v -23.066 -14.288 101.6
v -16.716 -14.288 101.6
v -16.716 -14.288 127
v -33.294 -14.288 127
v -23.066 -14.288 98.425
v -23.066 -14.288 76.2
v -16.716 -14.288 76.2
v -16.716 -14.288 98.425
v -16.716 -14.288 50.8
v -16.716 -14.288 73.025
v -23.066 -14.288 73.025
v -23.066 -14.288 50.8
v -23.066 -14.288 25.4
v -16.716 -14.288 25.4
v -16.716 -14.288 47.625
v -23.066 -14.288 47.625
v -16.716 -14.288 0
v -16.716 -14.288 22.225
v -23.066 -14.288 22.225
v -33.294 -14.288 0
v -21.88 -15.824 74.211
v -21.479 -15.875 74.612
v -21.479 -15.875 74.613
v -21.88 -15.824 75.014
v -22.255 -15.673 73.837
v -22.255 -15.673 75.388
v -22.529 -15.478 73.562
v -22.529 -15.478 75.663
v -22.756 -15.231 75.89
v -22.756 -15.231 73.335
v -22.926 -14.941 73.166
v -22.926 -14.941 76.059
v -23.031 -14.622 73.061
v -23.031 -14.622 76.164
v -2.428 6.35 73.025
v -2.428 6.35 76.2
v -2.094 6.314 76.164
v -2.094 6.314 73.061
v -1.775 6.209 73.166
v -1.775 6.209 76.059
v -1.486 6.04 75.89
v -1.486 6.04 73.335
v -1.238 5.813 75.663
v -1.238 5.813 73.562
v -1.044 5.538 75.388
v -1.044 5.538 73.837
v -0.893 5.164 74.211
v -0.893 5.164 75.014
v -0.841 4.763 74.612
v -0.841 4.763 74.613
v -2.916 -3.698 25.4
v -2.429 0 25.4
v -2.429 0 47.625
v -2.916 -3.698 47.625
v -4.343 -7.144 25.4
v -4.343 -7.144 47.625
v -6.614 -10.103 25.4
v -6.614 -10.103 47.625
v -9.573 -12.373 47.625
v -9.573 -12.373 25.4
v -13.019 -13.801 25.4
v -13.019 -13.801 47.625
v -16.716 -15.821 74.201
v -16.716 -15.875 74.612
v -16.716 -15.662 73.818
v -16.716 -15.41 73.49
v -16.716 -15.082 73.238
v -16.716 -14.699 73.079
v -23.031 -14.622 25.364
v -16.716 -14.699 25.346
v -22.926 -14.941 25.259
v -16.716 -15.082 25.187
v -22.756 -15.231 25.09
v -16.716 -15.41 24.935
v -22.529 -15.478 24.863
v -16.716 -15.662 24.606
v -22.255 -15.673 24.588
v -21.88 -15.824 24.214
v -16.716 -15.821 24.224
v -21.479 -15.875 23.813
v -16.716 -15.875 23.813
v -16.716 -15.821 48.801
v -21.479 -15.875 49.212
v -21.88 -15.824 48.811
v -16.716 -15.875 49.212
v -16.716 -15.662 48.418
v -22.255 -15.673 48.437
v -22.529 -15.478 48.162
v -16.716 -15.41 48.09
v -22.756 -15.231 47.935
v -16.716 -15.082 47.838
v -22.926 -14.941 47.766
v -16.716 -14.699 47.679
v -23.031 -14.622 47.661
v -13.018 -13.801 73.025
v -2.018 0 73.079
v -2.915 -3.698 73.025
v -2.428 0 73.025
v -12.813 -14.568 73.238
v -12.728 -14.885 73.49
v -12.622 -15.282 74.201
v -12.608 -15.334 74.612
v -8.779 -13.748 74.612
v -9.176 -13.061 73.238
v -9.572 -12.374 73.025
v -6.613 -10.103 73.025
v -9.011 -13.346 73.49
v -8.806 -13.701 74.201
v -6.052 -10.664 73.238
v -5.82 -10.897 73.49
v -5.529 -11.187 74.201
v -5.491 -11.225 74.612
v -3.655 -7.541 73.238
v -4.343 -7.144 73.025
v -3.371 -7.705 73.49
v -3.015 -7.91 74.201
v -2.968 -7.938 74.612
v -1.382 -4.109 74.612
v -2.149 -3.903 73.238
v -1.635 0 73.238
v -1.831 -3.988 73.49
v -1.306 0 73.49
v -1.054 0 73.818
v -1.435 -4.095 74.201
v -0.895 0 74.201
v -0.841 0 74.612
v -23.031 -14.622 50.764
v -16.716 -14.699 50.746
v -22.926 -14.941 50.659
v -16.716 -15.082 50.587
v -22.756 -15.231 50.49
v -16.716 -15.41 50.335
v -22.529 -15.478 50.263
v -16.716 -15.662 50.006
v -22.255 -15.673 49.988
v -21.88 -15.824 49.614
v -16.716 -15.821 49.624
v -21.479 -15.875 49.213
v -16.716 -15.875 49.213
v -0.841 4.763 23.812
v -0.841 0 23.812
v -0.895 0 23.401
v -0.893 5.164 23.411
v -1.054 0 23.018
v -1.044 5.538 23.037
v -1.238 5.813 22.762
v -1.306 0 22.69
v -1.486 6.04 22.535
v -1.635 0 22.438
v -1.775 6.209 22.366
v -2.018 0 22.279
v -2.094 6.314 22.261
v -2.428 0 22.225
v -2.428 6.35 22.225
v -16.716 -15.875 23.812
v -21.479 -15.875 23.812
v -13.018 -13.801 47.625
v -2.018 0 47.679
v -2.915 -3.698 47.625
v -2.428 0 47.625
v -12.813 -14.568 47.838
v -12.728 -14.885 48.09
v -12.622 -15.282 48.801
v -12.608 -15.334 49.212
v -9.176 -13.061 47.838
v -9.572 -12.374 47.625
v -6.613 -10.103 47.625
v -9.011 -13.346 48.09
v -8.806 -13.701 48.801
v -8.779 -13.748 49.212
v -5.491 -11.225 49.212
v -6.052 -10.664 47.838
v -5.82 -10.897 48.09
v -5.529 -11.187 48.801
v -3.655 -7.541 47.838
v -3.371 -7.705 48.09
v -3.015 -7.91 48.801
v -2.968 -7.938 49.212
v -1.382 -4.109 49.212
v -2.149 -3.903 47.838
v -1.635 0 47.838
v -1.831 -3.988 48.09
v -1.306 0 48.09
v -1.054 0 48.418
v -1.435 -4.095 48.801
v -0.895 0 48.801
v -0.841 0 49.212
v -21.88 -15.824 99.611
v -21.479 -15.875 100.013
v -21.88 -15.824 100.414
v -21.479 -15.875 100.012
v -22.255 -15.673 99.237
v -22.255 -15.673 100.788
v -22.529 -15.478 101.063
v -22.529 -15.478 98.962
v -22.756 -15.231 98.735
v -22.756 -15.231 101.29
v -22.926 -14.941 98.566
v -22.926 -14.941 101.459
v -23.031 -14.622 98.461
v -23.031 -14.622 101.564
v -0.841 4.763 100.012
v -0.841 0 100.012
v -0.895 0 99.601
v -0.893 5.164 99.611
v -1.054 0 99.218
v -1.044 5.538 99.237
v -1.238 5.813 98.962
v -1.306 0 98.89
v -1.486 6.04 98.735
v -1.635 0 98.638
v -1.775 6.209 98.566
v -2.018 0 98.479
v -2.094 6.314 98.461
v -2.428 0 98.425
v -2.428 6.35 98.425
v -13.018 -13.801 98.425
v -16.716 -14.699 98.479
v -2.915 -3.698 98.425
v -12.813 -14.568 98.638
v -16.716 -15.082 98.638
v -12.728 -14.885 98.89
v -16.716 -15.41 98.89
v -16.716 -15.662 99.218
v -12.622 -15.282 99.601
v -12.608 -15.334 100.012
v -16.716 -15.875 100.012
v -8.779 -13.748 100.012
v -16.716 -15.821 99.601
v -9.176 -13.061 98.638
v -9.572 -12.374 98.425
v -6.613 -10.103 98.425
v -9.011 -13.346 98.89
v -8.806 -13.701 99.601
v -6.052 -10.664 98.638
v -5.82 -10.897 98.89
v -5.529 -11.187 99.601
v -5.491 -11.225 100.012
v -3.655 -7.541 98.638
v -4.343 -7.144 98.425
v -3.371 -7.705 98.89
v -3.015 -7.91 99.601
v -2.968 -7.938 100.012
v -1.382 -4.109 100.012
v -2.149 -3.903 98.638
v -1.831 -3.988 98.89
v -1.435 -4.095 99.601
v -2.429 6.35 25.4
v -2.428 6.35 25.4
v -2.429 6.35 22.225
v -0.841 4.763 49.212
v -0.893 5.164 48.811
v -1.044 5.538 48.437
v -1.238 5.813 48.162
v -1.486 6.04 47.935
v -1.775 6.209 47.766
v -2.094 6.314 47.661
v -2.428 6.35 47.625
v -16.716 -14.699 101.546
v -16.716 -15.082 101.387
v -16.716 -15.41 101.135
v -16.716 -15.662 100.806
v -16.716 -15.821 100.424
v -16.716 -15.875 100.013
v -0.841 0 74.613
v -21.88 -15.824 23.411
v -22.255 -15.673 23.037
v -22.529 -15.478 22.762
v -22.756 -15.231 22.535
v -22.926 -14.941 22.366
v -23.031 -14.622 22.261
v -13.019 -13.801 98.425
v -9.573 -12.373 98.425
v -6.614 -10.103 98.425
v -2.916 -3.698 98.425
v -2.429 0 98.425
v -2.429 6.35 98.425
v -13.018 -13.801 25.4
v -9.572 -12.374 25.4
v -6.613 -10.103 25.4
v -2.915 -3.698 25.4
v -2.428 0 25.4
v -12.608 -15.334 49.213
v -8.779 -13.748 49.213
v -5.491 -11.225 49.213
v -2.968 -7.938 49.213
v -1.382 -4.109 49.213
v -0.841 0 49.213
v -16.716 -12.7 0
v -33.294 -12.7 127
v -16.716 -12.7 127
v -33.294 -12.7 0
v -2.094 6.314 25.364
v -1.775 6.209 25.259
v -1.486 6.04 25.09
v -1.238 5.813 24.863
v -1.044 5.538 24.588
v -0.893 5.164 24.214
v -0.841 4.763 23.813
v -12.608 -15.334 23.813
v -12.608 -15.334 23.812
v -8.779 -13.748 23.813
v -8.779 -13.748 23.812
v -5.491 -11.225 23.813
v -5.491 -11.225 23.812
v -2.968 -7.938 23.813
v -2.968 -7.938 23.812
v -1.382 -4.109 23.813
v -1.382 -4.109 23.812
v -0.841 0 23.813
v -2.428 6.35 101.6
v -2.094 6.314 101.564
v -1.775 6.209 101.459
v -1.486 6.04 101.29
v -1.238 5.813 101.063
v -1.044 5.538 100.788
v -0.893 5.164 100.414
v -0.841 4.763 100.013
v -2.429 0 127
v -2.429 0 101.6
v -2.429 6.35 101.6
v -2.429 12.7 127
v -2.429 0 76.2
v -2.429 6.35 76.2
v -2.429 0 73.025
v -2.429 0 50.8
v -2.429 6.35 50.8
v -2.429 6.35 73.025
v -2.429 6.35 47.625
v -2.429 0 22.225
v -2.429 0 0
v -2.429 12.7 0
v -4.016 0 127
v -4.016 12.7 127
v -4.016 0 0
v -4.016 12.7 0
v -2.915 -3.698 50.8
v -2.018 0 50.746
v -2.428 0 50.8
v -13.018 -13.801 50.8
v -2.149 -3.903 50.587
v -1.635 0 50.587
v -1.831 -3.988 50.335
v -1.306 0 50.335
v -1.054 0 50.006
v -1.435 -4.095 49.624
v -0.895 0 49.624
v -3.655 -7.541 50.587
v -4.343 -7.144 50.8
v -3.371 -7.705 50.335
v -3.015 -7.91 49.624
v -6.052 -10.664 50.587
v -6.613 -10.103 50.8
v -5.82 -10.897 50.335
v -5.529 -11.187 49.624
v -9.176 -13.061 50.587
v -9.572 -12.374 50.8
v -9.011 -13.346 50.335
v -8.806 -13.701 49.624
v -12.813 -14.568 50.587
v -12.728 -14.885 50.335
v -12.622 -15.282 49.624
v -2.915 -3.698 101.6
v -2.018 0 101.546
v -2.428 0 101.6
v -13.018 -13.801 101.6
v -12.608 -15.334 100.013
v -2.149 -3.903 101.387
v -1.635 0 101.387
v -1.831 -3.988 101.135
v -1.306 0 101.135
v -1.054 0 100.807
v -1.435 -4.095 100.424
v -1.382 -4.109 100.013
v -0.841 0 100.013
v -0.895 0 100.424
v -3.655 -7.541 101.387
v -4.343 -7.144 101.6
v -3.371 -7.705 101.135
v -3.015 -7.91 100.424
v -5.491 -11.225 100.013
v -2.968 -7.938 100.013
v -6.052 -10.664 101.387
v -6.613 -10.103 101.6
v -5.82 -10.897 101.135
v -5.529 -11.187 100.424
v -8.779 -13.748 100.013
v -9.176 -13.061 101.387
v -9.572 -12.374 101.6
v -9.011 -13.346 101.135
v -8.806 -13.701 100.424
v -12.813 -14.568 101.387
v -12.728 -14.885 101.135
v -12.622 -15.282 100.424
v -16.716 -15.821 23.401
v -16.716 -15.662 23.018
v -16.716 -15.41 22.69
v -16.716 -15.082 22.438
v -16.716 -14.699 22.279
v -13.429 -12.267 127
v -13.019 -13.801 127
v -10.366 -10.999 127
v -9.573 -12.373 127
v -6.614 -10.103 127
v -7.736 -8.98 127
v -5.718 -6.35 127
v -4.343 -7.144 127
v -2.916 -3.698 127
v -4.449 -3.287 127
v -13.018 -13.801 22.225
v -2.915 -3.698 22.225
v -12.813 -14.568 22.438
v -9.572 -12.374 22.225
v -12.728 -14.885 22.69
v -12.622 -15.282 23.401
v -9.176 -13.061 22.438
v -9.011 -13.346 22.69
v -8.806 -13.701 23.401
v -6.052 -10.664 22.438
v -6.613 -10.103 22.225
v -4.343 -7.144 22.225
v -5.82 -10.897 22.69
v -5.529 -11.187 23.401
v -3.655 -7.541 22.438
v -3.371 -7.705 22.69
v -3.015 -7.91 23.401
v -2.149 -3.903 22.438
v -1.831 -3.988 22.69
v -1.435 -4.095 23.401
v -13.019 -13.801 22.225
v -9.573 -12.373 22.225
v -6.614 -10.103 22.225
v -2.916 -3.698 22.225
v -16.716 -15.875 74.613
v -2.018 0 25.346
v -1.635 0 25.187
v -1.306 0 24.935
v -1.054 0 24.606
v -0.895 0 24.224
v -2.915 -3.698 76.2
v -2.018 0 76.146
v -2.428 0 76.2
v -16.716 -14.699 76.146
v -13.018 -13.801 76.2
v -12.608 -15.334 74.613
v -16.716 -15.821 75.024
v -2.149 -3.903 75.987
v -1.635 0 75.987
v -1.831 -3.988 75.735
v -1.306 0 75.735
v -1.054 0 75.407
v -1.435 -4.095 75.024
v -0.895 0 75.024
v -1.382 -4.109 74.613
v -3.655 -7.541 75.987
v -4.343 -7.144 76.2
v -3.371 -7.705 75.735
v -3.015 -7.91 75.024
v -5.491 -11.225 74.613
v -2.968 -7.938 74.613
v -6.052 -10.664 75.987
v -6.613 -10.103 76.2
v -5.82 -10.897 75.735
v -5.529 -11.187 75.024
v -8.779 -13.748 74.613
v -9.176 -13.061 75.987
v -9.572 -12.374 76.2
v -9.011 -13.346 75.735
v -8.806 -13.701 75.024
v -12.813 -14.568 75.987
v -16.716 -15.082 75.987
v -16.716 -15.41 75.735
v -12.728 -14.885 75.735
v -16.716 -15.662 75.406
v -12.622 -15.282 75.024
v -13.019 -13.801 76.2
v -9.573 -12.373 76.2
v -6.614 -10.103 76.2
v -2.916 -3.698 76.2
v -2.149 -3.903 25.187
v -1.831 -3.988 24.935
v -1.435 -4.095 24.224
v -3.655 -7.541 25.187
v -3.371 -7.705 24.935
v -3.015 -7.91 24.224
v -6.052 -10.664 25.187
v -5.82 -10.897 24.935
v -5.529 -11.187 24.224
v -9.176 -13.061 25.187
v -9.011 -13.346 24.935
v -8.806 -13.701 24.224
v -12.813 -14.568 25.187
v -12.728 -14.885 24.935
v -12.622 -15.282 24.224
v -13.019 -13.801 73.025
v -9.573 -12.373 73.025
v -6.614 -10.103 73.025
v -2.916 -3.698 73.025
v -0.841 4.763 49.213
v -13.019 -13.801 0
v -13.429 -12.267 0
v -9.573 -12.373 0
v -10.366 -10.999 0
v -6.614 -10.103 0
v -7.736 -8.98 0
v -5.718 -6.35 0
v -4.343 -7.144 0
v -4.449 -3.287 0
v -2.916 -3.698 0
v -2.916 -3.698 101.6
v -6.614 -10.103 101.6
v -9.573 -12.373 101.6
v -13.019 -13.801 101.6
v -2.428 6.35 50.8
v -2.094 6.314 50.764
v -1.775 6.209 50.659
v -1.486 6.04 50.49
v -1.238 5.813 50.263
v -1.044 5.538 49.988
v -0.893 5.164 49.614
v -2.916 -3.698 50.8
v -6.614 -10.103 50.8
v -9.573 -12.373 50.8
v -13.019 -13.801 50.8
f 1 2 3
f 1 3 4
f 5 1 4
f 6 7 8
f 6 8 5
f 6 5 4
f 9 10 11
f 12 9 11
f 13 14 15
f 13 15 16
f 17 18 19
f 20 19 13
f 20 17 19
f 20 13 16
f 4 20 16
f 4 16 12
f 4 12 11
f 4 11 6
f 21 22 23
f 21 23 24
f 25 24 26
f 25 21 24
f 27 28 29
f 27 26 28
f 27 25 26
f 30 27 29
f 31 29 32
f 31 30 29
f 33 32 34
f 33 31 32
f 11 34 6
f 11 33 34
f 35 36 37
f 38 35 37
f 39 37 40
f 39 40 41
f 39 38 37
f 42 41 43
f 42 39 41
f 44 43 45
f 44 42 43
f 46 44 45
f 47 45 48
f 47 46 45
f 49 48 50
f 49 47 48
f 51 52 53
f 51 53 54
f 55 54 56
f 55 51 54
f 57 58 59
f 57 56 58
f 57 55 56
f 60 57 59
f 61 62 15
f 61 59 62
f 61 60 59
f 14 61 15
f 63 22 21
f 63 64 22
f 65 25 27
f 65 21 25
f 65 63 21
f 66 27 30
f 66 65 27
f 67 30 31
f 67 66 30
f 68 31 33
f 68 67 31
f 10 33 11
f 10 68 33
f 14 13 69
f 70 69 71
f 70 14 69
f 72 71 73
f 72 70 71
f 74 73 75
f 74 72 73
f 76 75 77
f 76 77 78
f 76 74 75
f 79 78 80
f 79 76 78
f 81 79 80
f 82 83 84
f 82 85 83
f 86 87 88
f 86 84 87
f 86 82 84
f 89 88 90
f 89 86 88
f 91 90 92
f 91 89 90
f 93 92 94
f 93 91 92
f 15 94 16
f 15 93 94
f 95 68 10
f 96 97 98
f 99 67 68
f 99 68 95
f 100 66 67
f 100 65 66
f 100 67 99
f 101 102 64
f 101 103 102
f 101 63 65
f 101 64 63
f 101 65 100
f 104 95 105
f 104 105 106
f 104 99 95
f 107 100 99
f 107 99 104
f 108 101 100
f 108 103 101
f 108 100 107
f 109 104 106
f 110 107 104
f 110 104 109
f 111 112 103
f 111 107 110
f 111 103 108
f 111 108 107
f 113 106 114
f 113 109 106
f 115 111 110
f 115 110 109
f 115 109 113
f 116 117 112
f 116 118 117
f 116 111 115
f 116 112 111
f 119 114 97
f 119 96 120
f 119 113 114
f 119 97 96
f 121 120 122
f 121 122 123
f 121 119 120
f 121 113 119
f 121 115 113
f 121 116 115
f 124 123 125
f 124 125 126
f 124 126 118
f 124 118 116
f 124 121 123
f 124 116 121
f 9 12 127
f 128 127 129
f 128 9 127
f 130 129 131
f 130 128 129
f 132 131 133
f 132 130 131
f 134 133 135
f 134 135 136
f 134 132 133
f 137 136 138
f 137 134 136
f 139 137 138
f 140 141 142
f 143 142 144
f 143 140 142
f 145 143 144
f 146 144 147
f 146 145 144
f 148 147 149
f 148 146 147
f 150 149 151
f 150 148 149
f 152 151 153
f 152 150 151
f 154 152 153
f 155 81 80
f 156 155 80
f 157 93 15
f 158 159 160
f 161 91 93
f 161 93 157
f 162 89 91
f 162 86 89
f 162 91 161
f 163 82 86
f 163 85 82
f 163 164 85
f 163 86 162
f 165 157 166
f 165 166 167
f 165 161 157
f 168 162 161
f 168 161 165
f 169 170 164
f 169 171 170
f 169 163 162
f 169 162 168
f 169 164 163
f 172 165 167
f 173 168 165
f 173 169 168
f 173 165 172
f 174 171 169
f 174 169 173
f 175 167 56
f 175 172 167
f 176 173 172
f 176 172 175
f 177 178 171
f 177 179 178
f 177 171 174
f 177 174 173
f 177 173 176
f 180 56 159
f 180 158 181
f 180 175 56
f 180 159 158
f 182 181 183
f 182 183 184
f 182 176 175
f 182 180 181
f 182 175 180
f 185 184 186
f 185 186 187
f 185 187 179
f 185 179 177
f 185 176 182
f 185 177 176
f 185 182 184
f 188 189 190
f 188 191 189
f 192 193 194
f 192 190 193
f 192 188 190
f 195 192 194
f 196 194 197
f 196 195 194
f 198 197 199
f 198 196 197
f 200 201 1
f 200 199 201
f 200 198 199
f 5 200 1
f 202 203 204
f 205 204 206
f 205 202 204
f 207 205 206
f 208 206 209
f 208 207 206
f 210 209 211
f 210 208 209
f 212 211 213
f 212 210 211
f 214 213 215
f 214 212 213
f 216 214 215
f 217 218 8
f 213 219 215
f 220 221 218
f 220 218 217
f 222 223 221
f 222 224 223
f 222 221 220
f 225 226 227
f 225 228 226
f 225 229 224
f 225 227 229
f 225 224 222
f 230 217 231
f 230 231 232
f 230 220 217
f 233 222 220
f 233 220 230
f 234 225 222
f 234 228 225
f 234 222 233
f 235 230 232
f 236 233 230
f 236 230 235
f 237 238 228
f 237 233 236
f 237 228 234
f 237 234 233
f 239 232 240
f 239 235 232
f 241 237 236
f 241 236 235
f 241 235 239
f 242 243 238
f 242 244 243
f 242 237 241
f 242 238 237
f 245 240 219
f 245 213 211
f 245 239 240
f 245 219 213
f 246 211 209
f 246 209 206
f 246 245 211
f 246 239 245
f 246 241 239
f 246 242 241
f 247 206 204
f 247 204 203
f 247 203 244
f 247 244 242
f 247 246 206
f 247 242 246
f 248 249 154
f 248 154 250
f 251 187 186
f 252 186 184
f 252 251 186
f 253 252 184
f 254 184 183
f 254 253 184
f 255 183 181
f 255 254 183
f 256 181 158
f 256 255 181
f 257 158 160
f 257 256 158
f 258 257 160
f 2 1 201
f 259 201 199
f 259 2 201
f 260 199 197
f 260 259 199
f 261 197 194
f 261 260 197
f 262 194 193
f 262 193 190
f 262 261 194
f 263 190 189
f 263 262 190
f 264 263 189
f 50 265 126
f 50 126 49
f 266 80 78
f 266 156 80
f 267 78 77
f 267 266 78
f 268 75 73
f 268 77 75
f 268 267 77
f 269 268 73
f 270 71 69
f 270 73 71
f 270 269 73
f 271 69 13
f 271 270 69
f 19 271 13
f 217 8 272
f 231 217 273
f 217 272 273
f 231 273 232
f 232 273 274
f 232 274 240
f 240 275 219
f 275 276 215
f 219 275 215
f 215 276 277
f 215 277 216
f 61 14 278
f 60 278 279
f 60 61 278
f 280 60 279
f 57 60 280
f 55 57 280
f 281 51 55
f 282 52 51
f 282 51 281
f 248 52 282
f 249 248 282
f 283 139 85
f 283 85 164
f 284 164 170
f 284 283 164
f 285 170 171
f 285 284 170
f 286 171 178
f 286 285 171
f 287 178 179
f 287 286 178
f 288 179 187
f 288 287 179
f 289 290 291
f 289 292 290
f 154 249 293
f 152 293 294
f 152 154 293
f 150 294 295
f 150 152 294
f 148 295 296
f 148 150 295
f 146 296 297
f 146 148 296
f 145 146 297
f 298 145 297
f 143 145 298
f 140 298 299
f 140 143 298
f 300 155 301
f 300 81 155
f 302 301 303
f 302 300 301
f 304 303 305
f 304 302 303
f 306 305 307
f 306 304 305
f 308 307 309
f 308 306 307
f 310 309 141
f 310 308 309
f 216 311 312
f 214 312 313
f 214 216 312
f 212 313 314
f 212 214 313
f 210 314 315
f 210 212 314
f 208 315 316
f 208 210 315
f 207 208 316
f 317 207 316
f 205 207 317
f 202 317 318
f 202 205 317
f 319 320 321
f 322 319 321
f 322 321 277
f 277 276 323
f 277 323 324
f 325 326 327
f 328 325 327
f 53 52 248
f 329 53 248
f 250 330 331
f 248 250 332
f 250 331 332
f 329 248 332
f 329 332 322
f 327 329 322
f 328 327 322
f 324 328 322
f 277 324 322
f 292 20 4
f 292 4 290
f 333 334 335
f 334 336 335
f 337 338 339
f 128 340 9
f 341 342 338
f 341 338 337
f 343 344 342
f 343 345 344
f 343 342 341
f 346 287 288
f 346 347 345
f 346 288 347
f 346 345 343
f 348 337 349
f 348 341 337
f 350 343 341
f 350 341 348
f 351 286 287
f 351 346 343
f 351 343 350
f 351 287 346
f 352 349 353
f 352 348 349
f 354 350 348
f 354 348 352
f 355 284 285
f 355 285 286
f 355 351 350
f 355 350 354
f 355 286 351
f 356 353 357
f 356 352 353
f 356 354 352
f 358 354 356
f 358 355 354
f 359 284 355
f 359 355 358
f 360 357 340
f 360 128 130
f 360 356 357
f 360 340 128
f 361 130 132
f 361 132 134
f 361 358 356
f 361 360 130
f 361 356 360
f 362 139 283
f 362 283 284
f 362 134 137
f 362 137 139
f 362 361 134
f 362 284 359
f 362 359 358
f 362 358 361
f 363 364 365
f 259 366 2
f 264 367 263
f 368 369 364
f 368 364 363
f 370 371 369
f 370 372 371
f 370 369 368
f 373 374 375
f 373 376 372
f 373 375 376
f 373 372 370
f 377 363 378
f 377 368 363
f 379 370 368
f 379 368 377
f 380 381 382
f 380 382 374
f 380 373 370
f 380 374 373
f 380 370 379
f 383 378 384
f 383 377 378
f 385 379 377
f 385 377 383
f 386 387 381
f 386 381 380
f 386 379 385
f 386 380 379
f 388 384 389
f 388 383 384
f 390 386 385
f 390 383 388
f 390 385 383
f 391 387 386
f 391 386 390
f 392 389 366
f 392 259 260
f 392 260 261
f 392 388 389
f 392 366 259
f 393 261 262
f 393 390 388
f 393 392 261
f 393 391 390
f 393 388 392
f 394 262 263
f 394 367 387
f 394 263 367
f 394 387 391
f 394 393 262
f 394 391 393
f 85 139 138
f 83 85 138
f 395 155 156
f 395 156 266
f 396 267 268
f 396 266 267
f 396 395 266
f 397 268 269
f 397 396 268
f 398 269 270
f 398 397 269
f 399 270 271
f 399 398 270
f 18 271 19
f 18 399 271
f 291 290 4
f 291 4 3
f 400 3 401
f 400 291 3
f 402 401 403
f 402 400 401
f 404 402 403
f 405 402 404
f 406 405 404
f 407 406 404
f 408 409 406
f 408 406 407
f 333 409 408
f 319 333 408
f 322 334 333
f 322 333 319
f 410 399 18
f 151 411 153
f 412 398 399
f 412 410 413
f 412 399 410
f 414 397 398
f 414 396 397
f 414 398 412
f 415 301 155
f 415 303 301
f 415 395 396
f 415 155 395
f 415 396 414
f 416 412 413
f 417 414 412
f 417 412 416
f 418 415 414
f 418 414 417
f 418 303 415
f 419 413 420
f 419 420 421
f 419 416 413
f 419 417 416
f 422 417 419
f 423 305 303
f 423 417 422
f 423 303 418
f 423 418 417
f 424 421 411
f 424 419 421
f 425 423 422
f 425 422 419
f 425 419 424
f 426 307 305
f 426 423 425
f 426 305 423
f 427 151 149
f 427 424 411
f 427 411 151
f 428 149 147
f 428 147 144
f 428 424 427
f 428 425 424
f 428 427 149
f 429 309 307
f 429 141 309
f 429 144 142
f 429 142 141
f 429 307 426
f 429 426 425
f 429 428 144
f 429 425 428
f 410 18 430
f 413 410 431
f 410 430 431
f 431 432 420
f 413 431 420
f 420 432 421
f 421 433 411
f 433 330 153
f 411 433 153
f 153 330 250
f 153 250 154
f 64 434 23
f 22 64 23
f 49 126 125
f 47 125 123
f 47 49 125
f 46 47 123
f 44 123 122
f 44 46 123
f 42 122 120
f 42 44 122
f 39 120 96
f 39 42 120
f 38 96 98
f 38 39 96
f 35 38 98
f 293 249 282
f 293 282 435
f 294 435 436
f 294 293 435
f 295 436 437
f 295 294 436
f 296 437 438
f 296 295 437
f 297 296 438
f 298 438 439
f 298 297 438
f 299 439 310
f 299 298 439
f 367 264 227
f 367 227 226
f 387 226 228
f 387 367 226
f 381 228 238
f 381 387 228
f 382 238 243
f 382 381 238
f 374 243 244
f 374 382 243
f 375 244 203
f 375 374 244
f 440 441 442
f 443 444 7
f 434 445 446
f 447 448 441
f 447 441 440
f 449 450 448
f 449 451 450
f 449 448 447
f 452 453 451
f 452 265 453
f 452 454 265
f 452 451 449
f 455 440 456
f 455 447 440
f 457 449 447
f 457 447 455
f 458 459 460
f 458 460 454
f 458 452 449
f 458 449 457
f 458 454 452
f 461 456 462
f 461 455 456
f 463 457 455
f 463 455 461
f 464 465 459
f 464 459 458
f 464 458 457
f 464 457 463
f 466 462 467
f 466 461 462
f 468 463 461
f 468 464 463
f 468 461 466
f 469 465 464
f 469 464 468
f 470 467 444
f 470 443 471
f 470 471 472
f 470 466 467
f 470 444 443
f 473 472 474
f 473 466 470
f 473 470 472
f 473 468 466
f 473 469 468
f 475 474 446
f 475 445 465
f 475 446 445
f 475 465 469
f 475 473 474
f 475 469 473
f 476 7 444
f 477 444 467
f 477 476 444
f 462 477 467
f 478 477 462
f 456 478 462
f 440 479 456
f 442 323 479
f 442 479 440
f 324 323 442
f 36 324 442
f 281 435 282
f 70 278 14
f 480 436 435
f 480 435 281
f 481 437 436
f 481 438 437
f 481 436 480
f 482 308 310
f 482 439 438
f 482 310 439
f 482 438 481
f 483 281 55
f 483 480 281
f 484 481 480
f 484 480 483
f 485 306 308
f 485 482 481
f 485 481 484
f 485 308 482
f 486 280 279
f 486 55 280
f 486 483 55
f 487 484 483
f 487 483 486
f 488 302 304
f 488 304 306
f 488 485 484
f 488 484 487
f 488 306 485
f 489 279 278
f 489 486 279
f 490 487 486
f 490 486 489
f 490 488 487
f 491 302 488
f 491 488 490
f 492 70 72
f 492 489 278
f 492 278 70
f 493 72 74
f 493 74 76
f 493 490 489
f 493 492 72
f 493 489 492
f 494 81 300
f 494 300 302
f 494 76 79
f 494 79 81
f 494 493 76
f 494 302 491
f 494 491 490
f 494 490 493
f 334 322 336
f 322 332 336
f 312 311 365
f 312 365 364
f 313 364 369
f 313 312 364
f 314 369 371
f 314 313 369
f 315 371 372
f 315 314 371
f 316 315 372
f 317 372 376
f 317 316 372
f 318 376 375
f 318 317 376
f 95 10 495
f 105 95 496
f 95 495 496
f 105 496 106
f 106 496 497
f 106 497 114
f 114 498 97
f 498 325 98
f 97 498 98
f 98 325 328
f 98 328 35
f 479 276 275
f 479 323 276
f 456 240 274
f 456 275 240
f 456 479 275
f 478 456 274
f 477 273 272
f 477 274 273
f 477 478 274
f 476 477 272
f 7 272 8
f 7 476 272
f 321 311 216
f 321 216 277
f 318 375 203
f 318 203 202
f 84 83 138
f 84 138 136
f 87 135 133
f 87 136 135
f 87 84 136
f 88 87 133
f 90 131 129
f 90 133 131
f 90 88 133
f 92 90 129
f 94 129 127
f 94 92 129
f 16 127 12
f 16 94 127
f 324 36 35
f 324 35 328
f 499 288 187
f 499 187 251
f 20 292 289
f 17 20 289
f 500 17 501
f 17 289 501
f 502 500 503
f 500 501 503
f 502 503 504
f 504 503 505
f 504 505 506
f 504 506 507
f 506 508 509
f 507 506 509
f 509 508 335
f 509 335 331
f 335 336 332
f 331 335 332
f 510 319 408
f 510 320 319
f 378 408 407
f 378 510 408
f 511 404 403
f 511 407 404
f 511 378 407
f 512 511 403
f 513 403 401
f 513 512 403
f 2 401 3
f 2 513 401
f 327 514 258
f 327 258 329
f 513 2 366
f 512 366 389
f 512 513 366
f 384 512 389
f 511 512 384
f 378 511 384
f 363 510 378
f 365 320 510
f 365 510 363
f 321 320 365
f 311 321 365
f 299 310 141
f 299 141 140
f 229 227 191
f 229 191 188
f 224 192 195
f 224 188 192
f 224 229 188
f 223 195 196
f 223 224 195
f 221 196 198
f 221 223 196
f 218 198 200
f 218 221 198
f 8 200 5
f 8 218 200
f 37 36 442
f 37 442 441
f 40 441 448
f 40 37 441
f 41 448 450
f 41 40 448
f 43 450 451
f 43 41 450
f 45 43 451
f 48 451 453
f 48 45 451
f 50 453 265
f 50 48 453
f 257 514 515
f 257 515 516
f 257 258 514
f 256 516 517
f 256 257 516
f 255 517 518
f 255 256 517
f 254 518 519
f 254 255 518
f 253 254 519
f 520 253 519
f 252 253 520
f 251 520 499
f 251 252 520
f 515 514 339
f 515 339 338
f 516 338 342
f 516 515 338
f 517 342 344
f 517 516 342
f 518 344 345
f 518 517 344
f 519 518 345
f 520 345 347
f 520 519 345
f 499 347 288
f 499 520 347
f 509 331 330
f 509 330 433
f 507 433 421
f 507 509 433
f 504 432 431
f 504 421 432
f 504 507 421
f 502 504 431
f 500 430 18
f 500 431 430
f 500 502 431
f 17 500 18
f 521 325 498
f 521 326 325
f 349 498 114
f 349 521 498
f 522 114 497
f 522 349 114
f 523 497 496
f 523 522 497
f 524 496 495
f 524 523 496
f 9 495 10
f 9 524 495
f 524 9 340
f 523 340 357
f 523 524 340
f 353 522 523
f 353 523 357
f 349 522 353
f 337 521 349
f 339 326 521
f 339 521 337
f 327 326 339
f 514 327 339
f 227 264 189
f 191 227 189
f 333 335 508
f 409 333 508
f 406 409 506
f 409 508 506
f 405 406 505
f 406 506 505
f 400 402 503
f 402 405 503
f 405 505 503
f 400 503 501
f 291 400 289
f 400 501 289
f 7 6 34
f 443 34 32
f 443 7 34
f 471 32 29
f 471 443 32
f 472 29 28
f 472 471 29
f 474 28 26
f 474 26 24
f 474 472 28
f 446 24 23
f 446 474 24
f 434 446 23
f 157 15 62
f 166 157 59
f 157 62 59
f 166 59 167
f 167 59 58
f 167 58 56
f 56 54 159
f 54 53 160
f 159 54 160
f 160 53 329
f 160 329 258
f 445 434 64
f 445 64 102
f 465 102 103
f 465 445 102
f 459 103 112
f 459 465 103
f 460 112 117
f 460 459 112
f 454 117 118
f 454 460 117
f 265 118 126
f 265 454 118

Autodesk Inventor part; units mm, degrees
ref_plane "YZ Plane" through (0, 0, 0) normal (1, 0, 0) x (0, 1, 0)
ref_plane "XZ Plane" through (0, 0, 0) normal (0, 1, 0) x (-1, 0, 0)
sketch "Sketch1" plane through (0, 0, 0) normal (0, 0, 1) x (1, 0, 0)
  line L0 (-2.4289, 0) -> (-2.4289, 12.7)
  line L1 (-2.4289, 12.7) -> (-4.0164, 12.7)
  line L2 (-4.0164, 12.7) -> (-4.0164, 0)
  line L3 (-4.0164, 0) -> (-29.4164, 0) construction
  line L4 (-33.2939, -14.2875) -> (-33.2939, -12.7)
  line L5 (-33.2939, -12.7) -> (-16.7164, -12.7)
  line L6 (-16.7164, -14.2875) -> (-33.2939, -14.2875)
  arc A0 (-16.7164, -14.2875) -> (-2.4289, 0) centre (-16.7164, 0) ccw
  arc A1 (-16.7164, -12.7) -> (-4.0164, 0) centre (-16.7164, 0) ccw
  dimension "d5" = 1.5875
  dimension "d9" = 1.5875
extrude "Extrusion1" add sketch "Sketch1" along normal blind 127
ref_plane "Work Plane1" through (0, 0, 101.6) normal (0, 0, 1) x (1, 0, 0)
sketch "Sketch2" plane through (0, 0, 101.6) normal (0, 0, 1) x (1, 0, 0)
  arc A0 (-16.7164, -14.2875) -> (-2.4289, 0) centre (-16.7164, 0) ccw projected
  arc A1 (-16.7164, -14.2875) -> (-2.4289, 0) centre (-16.7164, 0) ccw
  line L0 (-0.8414, 0) -> (-0.8414, 6.35)
  line L1 (-0.8414, 6.35) -> (-2.4289, 6.35)
  line L2 (-2.4289, 0) -> (-2.4289, 12.7) projected
  line L3 (-16.7164, -15.875) -> (-23.0664, -15.875)
  line L4 (-23.0664, -15.875) -> (-23.0664, -14.2875)
  line L5 (-16.7164, -14.2875) -> (-33.2939, -14.2875) projected
  line L6 (-23.0664, -14.2875) -> (-16.7164, -14.2875)
  line L7 (-2.4289, 6.35) -> (-2.4289, 0)
  arc A2 (-16.7164, -15.875) -> (-0.8414, 0) centre (-16.7164, 0) ccw
  line L8 (-16.7164, 0) -> (-16.7164, -14.2875) construction
  line L9 (-16.7164, -15.875) -> (-16.7164, -20.4579) construction
  point P0 (0, 0)
  dimension "d14" = 6.35
  dimension "d15" = 6.35
extrude "Extrusion2" add sketch "Sketch2" against normal blind 3.175
fillet "Fillet1" radius 1.5875 8 edges at (-0.8414, 6.35, 100.0125) (-5.4911, -11.2253, 101.6) (-0.8414, 3.175, 101.6) (-19.8914, -15.875, 101.6) (-5.4911, -11.2253, 98.425) (-0.8414, 3.175, 98.425) (-19.8914, -15.875, 98.425) (-23.0664, -15.875, 100.0125)
pattern_linear "Rectangular Pattern1" count 4 spacing 25.4 along (0, 0, -1) of "Extrusion2", "Fillet1"
properties part number "Grip"
